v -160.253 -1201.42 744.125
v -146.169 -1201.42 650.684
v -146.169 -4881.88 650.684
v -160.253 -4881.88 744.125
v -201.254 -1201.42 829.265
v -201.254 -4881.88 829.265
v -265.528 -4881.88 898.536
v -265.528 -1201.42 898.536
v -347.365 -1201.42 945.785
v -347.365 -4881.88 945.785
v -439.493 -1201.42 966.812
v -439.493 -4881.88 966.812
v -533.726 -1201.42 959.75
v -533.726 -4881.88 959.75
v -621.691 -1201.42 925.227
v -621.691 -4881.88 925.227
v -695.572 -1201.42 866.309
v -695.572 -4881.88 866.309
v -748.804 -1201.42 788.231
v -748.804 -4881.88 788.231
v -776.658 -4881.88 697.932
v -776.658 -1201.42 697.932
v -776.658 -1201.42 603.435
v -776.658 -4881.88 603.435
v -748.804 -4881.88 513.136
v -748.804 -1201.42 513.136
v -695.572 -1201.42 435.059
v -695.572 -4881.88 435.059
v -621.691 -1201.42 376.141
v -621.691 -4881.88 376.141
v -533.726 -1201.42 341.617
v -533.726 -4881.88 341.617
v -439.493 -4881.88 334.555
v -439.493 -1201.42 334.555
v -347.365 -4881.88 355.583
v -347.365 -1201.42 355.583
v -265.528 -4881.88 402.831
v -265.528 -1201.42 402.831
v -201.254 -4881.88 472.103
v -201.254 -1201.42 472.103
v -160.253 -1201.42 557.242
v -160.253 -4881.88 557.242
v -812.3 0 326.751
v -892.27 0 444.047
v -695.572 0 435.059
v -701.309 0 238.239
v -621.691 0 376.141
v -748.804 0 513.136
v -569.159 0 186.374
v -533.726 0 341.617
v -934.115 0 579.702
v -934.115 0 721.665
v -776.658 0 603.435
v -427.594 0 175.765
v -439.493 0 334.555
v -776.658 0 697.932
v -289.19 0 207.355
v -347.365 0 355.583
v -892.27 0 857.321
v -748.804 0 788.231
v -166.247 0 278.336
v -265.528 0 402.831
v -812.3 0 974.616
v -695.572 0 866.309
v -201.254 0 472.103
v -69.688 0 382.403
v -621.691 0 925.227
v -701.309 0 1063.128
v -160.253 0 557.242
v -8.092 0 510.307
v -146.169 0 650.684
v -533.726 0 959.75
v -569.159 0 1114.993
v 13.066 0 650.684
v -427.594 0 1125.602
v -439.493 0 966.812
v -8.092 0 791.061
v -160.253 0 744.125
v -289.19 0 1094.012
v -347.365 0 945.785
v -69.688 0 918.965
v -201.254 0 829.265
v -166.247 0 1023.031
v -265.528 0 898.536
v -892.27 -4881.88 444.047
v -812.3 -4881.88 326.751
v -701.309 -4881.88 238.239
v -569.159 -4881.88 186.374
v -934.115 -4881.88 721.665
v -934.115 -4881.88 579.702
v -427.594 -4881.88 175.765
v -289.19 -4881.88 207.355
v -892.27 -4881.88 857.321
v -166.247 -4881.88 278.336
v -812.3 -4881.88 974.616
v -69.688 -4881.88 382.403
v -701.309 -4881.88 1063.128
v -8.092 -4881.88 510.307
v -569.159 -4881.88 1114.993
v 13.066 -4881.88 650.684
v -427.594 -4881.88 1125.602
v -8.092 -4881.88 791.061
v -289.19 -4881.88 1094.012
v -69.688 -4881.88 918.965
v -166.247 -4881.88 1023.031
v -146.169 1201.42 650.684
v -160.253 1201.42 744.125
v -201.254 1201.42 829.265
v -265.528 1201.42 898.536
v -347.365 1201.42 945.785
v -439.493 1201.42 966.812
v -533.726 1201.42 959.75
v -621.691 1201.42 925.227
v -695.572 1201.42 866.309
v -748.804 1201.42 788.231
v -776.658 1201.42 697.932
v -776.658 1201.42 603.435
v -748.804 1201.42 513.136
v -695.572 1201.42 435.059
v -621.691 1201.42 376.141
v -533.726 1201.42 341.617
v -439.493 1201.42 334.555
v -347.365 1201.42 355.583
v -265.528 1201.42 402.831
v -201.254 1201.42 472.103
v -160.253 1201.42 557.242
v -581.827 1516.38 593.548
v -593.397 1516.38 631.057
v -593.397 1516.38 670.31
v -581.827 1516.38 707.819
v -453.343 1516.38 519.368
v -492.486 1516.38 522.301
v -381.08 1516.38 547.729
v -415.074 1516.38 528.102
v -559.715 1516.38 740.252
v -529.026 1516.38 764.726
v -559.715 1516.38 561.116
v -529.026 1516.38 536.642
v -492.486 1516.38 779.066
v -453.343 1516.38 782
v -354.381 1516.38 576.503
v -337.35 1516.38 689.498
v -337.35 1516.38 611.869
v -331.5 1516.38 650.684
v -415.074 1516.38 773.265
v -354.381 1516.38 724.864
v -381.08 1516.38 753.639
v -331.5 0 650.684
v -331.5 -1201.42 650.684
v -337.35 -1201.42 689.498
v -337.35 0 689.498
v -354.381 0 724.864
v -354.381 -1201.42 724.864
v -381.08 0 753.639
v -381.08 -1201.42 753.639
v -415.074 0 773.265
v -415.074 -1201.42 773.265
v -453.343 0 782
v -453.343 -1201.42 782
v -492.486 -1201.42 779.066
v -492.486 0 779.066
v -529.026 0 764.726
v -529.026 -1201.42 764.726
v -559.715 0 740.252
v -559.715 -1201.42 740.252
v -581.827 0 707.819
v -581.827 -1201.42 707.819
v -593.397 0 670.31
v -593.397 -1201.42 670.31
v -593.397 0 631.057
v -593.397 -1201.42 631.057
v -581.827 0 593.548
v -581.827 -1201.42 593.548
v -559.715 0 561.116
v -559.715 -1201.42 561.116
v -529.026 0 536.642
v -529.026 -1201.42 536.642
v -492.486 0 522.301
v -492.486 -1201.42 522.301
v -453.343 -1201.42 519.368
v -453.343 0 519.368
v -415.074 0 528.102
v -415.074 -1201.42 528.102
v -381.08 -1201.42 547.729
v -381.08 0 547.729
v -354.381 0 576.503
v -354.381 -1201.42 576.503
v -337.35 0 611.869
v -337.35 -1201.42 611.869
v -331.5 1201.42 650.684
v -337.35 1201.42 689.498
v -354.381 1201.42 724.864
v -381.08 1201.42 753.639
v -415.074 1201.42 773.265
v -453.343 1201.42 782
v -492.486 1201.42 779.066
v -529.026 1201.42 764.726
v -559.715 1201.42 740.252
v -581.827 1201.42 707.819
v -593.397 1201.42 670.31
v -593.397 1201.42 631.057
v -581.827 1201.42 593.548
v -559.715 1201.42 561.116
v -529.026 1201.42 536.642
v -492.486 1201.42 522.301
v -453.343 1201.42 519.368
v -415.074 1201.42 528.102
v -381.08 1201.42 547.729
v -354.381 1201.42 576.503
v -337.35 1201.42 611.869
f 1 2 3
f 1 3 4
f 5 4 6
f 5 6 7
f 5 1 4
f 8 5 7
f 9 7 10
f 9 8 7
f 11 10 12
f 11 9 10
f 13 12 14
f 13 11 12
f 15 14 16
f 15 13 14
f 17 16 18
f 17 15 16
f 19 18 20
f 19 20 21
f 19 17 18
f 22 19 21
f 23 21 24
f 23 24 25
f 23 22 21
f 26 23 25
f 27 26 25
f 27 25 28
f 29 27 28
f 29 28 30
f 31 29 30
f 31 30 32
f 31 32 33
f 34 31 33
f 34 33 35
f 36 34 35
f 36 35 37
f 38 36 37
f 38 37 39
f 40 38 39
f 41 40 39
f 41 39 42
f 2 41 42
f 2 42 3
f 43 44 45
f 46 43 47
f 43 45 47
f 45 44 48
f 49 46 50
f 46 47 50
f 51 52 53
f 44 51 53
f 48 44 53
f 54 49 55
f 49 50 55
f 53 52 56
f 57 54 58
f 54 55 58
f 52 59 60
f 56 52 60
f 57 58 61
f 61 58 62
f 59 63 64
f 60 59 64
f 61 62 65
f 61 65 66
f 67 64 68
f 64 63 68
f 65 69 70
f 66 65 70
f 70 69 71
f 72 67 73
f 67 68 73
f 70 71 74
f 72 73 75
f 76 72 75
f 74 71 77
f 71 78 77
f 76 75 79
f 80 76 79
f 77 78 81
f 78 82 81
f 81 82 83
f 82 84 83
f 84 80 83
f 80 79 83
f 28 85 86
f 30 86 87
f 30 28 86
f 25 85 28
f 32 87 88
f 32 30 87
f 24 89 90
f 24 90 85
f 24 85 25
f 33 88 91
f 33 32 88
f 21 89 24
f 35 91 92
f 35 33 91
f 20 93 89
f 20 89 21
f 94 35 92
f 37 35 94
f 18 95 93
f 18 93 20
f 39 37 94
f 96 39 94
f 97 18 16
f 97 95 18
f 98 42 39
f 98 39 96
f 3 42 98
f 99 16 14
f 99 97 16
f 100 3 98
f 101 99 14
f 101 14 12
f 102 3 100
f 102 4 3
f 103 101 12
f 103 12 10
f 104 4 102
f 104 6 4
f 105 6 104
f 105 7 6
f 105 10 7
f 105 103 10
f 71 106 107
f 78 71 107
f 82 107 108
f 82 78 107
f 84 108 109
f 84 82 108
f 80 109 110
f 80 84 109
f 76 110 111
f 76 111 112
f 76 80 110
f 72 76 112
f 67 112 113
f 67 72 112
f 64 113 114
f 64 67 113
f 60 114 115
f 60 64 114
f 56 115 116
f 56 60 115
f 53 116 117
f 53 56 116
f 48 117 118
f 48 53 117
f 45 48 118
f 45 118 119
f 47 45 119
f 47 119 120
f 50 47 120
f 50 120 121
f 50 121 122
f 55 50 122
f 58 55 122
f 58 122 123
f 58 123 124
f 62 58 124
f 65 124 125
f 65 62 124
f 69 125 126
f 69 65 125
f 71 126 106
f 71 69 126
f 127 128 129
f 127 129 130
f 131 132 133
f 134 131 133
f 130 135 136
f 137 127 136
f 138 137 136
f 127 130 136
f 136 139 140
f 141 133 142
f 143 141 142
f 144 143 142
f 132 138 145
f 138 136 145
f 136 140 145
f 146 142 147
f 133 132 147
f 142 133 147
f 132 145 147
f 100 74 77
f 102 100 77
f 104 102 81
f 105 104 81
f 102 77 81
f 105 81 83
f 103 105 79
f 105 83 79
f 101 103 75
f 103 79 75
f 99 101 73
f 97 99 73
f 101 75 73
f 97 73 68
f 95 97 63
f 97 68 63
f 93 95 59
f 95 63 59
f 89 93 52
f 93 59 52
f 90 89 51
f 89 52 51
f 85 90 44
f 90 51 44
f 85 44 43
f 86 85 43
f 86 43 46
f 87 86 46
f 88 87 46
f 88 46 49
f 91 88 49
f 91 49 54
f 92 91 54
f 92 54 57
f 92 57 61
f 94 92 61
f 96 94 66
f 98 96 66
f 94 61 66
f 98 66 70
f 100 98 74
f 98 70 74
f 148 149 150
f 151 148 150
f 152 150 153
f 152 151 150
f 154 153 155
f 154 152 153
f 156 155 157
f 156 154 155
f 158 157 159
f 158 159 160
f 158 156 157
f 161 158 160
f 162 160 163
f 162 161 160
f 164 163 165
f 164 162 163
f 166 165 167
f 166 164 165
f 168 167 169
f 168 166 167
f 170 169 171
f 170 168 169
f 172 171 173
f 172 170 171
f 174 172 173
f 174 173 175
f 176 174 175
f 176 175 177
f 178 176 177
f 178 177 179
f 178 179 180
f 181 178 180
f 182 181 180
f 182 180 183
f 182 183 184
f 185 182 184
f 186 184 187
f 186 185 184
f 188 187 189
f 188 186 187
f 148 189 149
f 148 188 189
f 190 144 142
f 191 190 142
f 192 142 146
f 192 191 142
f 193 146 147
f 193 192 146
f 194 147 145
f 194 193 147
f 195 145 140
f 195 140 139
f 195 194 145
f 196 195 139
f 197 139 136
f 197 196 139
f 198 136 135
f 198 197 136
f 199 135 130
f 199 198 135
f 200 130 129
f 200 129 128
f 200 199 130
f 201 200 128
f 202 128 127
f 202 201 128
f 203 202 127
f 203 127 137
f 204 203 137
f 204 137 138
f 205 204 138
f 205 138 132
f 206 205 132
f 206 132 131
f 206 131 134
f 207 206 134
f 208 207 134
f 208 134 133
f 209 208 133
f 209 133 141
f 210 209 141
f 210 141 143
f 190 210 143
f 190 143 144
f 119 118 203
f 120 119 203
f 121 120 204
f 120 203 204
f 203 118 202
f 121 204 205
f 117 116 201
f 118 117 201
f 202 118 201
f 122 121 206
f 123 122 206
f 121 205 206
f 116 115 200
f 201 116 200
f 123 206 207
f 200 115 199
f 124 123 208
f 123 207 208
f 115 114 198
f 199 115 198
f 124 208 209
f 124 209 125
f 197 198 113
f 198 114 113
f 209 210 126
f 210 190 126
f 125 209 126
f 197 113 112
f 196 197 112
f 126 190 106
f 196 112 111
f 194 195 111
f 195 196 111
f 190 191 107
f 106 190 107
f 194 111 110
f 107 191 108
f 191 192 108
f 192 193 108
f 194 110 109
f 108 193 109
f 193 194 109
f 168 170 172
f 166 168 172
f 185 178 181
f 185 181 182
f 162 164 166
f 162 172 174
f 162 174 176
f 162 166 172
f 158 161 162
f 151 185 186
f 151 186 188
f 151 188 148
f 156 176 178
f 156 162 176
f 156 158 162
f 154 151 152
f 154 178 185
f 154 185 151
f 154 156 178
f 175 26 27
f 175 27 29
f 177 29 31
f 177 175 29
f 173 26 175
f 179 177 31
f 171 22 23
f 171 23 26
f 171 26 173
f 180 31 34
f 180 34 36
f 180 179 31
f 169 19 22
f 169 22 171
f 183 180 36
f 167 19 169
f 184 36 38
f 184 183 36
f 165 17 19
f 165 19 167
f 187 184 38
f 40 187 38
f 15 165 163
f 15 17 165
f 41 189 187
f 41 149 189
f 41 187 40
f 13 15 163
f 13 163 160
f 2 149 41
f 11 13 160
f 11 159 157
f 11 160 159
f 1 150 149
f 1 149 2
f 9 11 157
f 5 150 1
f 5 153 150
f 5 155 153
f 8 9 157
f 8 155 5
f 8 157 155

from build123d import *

# Parameters (mm, degrees)
F0_R     = 476.25
F0_R_2   = 317.014892
F1_DEPTH = 4881.88
F0_R_3   = 131.684276
F2_DEPTH = 1201.42
F3_DEPTH = 1516.38


with BuildPart() as f1:
    # F0 (on Front) → F1 (new body)
    with BuildSketch(Plane.XZ):
        with Locations((-463.18385, 650.683701)):
            Circle(F0_R)
        with Locations((-463.18385, 650.683701)):
            Circle(F0_R_2, mode=Mode.SUBTRACT)
    extrude(amount=F1_DEPTH)

    # F0 (on Front) → F2 (join, symmetric)
    with BuildSketch(Plane.XZ):
        with Locations((-463.18385, 650.683701)):
            Circle(F0_R_2)
        with Locations((-463.18385, 650.683701)):
            Circle(F0_R_3, mode=Mode.SUBTRACT)
    extrude(amount=F2_DEPTH, both=True)

    # F0 (on Front) → F3 (join)
    with BuildSketch(Plane.XZ):
        with Locations((-463.18385, 650.683701)):
            Circle(F0_R_3)
    extrude(amount=-F3_DEPTH)


solid = f1.part
